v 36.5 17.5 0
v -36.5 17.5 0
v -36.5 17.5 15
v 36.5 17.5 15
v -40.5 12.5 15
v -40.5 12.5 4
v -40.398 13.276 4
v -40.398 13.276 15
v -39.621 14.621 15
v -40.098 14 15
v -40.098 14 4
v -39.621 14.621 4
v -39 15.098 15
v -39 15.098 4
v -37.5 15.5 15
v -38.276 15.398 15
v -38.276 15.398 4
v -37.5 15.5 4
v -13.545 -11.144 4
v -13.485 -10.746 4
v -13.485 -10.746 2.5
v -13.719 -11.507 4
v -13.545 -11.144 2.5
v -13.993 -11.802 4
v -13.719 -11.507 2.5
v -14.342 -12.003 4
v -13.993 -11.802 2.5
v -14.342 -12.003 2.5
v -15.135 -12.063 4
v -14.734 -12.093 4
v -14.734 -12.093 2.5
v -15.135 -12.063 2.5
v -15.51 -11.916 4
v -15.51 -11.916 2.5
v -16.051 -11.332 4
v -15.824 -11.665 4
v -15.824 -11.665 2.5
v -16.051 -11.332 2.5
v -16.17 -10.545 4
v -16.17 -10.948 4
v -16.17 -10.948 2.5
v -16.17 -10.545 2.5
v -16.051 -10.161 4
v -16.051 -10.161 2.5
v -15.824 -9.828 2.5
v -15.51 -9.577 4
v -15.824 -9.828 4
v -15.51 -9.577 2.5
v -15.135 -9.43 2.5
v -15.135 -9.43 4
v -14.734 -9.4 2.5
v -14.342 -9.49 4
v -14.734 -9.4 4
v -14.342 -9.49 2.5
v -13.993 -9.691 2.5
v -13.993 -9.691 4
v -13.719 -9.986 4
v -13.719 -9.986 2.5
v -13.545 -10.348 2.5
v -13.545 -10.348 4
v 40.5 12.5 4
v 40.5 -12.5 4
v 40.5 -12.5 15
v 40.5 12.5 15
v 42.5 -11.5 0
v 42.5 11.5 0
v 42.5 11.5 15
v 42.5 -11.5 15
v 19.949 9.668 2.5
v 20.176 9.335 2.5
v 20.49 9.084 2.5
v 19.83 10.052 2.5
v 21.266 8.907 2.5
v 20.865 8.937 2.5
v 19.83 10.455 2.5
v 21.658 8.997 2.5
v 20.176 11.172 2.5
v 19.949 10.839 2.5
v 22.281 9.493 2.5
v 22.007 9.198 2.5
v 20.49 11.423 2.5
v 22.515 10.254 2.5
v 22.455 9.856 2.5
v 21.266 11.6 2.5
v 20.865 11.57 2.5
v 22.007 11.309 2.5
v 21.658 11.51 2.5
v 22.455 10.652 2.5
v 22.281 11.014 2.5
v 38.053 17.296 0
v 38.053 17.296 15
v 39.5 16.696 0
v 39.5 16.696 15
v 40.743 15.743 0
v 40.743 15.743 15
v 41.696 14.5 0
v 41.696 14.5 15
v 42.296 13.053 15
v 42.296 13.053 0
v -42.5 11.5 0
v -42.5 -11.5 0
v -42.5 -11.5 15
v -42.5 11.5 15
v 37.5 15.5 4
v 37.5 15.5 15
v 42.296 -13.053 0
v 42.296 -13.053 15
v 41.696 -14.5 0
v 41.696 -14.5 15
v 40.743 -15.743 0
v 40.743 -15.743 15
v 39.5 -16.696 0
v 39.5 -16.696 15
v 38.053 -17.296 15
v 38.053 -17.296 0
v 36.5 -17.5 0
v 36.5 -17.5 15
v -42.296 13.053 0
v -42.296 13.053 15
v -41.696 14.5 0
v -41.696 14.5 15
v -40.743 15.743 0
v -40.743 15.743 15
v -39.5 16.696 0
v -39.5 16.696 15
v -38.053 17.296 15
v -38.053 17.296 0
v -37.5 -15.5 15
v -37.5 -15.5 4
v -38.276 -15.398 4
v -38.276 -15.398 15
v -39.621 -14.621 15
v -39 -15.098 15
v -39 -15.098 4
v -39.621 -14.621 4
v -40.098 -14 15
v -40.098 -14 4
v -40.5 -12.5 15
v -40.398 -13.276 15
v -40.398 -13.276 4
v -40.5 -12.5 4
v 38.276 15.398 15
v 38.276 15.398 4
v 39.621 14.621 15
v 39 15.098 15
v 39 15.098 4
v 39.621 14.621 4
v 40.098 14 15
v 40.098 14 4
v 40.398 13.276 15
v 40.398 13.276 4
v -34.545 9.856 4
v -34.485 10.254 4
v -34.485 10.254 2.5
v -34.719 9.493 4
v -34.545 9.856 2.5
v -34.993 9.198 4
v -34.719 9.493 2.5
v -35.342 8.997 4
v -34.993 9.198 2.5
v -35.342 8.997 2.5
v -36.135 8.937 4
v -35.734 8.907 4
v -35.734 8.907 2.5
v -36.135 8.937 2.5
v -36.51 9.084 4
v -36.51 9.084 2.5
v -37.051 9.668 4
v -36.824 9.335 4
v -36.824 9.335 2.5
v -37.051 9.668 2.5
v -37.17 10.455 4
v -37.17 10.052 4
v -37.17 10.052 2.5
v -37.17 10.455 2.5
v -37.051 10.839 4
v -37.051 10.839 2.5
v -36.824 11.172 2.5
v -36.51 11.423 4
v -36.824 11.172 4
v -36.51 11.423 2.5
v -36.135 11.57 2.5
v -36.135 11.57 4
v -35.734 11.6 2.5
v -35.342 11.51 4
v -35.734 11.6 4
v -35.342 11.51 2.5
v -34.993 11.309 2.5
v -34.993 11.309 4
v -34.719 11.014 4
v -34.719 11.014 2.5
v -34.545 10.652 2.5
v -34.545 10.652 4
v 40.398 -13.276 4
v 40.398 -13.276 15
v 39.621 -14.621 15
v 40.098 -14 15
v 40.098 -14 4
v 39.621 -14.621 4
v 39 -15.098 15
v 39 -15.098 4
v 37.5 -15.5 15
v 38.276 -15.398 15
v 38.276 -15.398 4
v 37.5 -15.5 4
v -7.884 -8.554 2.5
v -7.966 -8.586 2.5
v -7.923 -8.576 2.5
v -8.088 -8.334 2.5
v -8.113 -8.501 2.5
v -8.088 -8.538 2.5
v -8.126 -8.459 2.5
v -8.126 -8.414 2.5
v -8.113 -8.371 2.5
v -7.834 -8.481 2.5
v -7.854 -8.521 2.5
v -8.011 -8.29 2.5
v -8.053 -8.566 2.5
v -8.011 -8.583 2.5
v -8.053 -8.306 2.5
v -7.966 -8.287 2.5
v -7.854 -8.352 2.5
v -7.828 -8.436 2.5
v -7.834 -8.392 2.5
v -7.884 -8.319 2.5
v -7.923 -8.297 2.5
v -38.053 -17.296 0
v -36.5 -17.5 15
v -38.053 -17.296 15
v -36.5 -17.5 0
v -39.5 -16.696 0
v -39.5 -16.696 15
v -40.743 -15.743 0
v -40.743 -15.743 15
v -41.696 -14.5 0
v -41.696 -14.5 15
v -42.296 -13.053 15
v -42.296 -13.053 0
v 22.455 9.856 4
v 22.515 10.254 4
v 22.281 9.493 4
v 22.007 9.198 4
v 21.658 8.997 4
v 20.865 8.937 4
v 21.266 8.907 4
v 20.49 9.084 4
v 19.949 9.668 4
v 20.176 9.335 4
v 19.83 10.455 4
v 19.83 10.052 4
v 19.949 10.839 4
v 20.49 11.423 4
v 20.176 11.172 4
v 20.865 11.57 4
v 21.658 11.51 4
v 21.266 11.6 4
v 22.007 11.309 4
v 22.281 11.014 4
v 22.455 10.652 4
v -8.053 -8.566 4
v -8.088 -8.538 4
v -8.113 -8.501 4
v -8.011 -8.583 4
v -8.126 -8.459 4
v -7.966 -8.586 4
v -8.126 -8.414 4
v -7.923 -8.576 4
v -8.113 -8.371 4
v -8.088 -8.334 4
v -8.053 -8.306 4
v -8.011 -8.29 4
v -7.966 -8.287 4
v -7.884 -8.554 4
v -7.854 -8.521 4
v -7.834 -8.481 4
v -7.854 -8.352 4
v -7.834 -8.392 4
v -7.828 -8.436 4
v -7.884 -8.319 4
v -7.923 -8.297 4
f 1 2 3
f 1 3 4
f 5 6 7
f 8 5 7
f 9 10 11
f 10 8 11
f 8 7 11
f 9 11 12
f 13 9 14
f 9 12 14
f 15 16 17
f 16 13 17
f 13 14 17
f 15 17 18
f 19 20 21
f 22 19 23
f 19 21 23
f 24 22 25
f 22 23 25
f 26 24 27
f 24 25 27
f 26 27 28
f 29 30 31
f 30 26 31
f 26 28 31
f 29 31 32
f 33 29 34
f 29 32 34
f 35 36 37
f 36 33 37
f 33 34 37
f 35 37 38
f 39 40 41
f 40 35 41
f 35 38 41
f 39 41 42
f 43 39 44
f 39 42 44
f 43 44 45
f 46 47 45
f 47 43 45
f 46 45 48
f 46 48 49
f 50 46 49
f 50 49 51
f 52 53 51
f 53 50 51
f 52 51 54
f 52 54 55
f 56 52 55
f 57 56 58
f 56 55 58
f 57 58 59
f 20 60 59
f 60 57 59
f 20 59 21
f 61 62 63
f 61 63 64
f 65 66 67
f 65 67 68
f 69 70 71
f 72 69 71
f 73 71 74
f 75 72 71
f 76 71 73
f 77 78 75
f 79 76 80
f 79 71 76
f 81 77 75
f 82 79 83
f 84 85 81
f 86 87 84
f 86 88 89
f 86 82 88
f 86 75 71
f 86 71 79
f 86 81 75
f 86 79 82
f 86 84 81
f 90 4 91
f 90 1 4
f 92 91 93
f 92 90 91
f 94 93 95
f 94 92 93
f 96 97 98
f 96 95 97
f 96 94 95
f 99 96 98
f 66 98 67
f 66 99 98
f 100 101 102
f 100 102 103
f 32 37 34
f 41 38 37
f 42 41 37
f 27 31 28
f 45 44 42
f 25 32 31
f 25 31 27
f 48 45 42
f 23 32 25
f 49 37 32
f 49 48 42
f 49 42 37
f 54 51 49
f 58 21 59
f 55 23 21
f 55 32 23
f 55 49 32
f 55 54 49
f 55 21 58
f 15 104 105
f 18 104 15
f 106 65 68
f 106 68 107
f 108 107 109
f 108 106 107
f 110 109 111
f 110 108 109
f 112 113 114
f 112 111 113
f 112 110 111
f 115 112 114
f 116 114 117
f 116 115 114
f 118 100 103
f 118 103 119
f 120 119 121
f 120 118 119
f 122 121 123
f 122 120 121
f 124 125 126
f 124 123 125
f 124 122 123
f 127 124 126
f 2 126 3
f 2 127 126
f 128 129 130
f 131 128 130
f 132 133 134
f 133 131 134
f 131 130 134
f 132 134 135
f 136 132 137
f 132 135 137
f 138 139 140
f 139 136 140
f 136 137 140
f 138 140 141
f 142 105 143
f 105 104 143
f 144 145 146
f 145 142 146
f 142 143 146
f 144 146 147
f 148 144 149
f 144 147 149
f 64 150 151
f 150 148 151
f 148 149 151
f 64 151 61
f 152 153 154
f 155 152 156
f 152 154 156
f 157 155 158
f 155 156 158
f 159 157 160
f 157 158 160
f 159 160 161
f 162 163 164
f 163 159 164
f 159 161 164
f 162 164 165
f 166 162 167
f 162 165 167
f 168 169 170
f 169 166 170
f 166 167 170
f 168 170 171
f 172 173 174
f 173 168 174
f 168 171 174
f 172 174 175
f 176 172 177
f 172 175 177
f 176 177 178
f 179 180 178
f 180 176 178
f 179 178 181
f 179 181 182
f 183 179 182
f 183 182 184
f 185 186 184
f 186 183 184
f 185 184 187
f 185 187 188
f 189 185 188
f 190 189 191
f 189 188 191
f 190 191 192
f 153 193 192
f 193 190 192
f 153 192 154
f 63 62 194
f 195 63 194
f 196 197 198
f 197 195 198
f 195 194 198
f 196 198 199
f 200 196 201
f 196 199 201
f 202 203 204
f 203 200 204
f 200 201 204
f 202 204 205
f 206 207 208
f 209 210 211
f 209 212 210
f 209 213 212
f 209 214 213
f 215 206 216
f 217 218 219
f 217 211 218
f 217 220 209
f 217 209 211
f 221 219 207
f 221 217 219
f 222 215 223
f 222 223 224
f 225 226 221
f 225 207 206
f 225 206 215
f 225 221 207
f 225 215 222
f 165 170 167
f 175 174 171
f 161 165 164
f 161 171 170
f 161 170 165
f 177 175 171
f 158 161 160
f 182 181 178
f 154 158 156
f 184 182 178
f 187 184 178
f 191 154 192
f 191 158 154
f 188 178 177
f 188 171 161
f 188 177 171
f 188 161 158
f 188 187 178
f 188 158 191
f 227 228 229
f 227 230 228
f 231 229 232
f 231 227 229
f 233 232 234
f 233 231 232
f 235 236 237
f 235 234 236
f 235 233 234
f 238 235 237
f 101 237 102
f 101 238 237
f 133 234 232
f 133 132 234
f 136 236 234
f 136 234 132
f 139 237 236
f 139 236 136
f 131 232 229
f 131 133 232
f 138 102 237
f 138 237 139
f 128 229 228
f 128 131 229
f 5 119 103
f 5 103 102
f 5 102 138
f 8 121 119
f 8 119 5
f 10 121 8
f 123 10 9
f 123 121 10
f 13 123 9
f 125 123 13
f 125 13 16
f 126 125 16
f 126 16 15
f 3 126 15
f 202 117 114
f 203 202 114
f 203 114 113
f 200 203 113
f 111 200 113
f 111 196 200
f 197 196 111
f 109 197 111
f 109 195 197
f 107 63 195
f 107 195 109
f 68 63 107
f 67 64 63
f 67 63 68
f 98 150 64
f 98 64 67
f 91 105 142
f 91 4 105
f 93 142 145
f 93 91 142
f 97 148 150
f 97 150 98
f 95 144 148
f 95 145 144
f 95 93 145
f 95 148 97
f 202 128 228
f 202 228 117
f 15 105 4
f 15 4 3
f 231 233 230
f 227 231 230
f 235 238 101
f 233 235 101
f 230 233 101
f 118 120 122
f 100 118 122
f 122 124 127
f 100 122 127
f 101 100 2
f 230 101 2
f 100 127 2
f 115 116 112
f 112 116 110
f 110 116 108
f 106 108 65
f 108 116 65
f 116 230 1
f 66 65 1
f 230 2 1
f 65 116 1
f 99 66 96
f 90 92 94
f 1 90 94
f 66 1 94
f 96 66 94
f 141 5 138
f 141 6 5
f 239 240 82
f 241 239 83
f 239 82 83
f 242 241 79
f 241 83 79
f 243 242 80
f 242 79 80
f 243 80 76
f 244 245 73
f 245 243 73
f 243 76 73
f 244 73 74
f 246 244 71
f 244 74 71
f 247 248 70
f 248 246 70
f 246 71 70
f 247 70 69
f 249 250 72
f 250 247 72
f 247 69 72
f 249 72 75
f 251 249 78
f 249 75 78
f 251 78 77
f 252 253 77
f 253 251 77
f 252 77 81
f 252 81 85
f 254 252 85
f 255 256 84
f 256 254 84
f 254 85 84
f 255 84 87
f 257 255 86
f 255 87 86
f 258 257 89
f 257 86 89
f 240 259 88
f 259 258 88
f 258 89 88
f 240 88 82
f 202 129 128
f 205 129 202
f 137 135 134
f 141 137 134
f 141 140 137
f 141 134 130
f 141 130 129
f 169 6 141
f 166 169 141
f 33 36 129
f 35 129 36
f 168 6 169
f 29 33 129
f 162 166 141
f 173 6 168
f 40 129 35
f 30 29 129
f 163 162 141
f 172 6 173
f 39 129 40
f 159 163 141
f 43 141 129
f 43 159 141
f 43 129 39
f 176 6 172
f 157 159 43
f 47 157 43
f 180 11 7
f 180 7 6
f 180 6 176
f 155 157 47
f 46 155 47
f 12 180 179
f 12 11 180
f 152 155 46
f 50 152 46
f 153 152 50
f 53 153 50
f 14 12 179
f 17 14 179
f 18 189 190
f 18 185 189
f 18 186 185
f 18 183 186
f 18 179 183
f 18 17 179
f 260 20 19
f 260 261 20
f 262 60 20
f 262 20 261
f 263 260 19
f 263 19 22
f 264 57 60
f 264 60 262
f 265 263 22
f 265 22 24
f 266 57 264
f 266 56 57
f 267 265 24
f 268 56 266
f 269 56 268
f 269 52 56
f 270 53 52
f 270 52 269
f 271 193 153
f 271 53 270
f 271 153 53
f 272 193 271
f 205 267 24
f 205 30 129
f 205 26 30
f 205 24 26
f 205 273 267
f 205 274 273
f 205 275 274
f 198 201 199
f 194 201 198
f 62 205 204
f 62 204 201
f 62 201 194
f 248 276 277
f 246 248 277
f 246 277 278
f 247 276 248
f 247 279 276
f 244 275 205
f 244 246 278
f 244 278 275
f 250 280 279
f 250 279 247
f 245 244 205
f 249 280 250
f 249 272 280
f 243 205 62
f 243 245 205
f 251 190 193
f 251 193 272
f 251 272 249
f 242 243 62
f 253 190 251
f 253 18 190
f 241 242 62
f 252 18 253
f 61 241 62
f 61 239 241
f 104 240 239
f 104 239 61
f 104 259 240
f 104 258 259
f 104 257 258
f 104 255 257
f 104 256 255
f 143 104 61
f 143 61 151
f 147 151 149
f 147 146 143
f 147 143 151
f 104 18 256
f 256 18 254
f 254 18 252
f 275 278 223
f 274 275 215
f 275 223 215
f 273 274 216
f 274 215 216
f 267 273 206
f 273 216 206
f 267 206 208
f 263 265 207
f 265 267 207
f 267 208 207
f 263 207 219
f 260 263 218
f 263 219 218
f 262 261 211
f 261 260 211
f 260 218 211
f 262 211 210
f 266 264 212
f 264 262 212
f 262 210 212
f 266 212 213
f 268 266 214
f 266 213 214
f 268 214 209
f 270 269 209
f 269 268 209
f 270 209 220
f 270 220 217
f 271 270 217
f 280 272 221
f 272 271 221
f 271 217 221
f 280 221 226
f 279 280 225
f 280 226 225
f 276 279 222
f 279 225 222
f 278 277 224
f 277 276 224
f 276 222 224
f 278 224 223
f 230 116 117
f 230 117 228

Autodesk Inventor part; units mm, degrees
ref_plane "YZ Plane" through (0, 0, 0) normal (1, 0, 0) x (0, 1, 0)
ref_plane "XZ Plane" through (0, 0, 0) normal (0, 1, 0) x (-1, 0, 0)
ref_plane "XY Plane" through (0, 0, 0) normal (0, 0, 1) x (1, 0, 0)
sketch "Sketch1" plane through (0, 0, 0) normal (0, 0, 1) x (1, 0, 0)
  line L0 (-16.1167, 9.6221) -> (-16.0287, 9.5557)
  line L1 (-16.2227, 9.6523) -> (-16.1167, 9.6221)
  line L2 (-16.3325, 9.6421) -> (-16.2227, 9.6523)
  line L3 (-16.4312, 9.593) -> (-16.3325, 9.6421)
  line L4 (-16.5055, 9.5115) -> (-16.4312, 9.593)
  line L5 (-16.0287, 9.5557) -> (-15.9707, 9.4619)
  line L6 (37.1652, -14.1251) -> (-36.8348, -14.1251)
  line L7 (37.1652, -14.1251) -> (-36.8348, -14.1251)
  line L8 (-13.126, 14.2536) -> (37.1652, 14.2536)
  line L9 (-13.126, 14.2536) -> (37.1652, 14.2536)
  circle A0 centre (21.1652, 10.2536) radius 1.35
  circle A1 centre (21.1652, 10.2536) radius 1.35
  line L10 (40.1652, 11.2536) -> (40.1652, -11.1251)
  line L11 (40.1652, 11.2536) -> (40.1652, -11.1251)
  line L12 (40.1463, 11.5895) -> (40.1652, 11.2536)
  line L13 (40.1463, 11.5895) -> (40.1652, 11.2536)
  line L14 (-16.4721, 8.3515) -> (-16.5301, 8.4452)
  line L15 (-16.4721, 8.3515) -> (-16.5301, 8.4452)
  line L16 (-15.971, 13.4619) -> (-15.9507, 13.3536)
  line L17 (-16.5507, 13.3536) -> (-16.5456, 13.4087)
  line L18 (-16.5507, 13.3536) -> (-16.5456, 13.4087)
  line L19 (-15.971, 13.4619) -> (-15.9507, 13.3536)
  line L20 (-16.5456, 13.4087) -> (-16.5058, 13.5115)
  line L21 (-16.5456, 13.4087) -> (-16.5058, 13.5115)
  line L22 (-16.029, 13.5557) -> (-15.971, 13.4619)
  line L23 (-16.029, 13.5557) -> (-15.971, 13.4619)
  line L24 (-16.117, 13.6221) -> (-16.029, 13.5557)
  line L25 (-16.117, 13.6221) -> (-16.029, 13.5557)
  line L26 (-16.223, 13.6523) -> (-16.117, 13.6221)
  line L27 (-16.223, 13.6523) -> (-16.117, 13.6221)
  line L28 (-16.3328, 13.6421) -> (-16.223, 13.6523)
  line L29 (-16.3328, 13.6421) -> (-16.223, 13.6523)
  line L30 (-16.5058, 13.5115) -> (-16.4315, 13.593)
  line L31 (-16.4315, 13.593) -> (-16.3328, 13.6421)
  line L32 (-16.4315, 13.593) -> (-16.3328, 13.6421)
  line L33 (-16.5058, 13.5115) -> (-16.4315, 13.593)
  line L34 (-39.1803, -12.9956) -> (-39.375, -12.7212)
  line L35 (-38.9562, -13.2464) -> (-39.1803, -12.9956)
  line L36 (-38.9562, -13.2464) -> (-39.1803, -12.9956)
  line L37 (-38.7053, -13.4706) -> (-38.9562, -13.2464)
  line L38 (-38.7053, -13.4706) -> (-38.9562, -13.2464)
  line L39 (-38.4309, -13.6653) -> (-38.7053, -13.4706)
  line L40 (-38.4309, -13.6653) -> (-38.7053, -13.4706)
  line L41 (-38.1365, -13.828) -> (-38.4309, -13.6653)
  line L42 (-38.1365, -13.828) -> (-38.4309, -13.6653)
  line L43 (-37.8257, -13.9568) -> (-38.1365, -13.828)
  line L44 (-37.8257, -13.9568) -> (-38.1365, -13.828)
  line L45 (-37.5024, -14.0499) -> (-37.8257, -13.9568)
  line L46 (-37.5024, -14.0499) -> (-37.8257, -13.9568)
  line L47 (-37.1707, -14.1062) -> (-37.5024, -14.0499)
  line L48 (-37.1707, -14.1062) -> (-37.5024, -14.0499)
  line L49 (-36.8348, -14.1251) -> (-37.1707, -14.1062)
  line L50 (-36.8348, -14.1251) -> (-37.1707, -14.1062)
  line L51 (-39.1803, -12.9956) -> (-39.375, -12.7212)
  line L52 (-27.681, 12.0452) -> (-27.7013, 12.1536)
  line L53 (-27.1013, 12.1536) -> (-27.1064, 12.0984)
  line L54 (-27.1013, 12.1536) -> (-27.1064, 12.0984)
  line L55 (-27.681, 12.0452) -> (-27.7013, 12.1536)
  line L56 (-27.1064, 12.0984) -> (-27.1462, 11.9956)
  line L57 (-27.1064, 12.0984) -> (-27.1462, 11.9956)
  line L58 (-27.623, 11.9515) -> (-27.681, 12.0452)
  line L59 (-27.623, 11.9515) -> (-27.681, 12.0452)
  line L60 (-27.535, 11.885) -> (-27.623, 11.9515)
  line L61 (-27.535, 11.885) -> (-27.623, 11.9515)
  line L62 (-27.429, 11.8548) -> (-27.535, 11.885)
  line L63 (-27.429, 11.8548) -> (-27.535, 11.885)
  line L64 (-27.1462, 11.9956) -> (-27.2205, 11.9142)
  line L65 (-27.3192, 11.865) -> (-27.429, 11.8548)
  line L66 (-27.3192, 11.865) -> (-27.429, 11.8548)
  line L67 (-27.2205, 11.9142) -> (-27.3192, 11.865)
  line L68 (-27.2205, 11.9142) -> (-27.3192, 11.865)
  line L69 (-27.1462, 11.9956) -> (-27.2205, 11.9142)
  line L70 (-27.7013, 12.1536) -> (-27.7013, 13.3536)
  line L71 (-27.1013, 13.3536) -> (-27.1013, 12.1536)
  line L72 (-27.7013, 12.1536) -> (-27.7013, 13.3536)
  line L73 (-27.1013, 13.3536) -> (-27.1013, 12.1536)
  line L74 (-27.7013, 13.3536) -> (-27.6962, 13.4087)
  line L75 (-27.7013, 13.3536) -> (-27.6962, 13.4087)
  line L76 (-27.1216, 13.4619) -> (-27.1013, 13.3536)
  line L77 (-27.1216, 13.4619) -> (-27.1013, 13.3536)
  line L78 (-27.6962, 13.4087) -> (-27.6564, 13.5115)
  line L79 (-27.6962, 13.4087) -> (-27.6564, 13.5115)
  line L80 (-27.1796, 13.5557) -> (-27.1216, 13.4619)
  line L81 (-27.1796, 13.5557) -> (-27.1216, 13.4619)
  line L82 (-27.2676, 13.6221) -> (-27.1796, 13.5557)
  line L83 (-27.2676, 13.6221) -> (-27.1796, 13.5557)
  line L84 (-27.6564, 13.5115) -> (-27.5821, 13.593)
  line L85 (-27.6564, 13.5115) -> (-27.5821, 13.593)
  line L86 (-27.5821, 13.593) -> (-27.4834, 13.6421)
  line L87 (-27.5821, 13.593) -> (-27.4834, 13.6421)
  line L88 (-27.4834, 9.6421) -> (-27.3736, 9.6523)
  line L89 (-27.4834, 9.6421) -> (-27.3736, 9.6523)
  line L90 (-27.3736, 9.6523) -> (-27.2676, 9.6221)
  line L91 (-27.6564, 9.5115) -> (-27.5821, 9.593)
  line L92 (-27.6962, 9.4087) -> (-27.6564, 9.5115)
  line L93 (-27.3736, 9.6523) -> (-27.2676, 9.6221)
  line L94 (-16.5507, 12.1536) -> (-16.5507, 13.3536)
  line L95 (-16.5304, 12.0452) -> (-16.5507, 12.1536)
  line L96 (-16.4724, 11.9515) -> (-16.5304, 12.0452)
  line L97 (-15.9507, 13.3536) -> (-15.9507, 12.1536)
  line L98 (-15.9507, 12.1536) -> (-15.9558, 12.0984)
  line L99 (-16.5507, 12.1536) -> (-16.5507, 13.3536)
  line L100 (-15.9507, 13.3536) -> (-15.9507, 12.1536)
  line L101 (-15.9507, 12.1536) -> (-15.9558, 12.0984)
  line L102 (-16.5304, 12.0452) -> (-16.5507, 12.1536)
  line L103 (-15.9558, 12.0984) -> (-15.9956, 11.9956)
  line L104 (-16.3844, 11.885) -> (-16.4724, 11.9515)
  line L105 (-16.3844, 11.885) -> (-16.4724, 11.9515)
  line L106 (-16.2784, 11.8548) -> (-16.3844, 11.885)
  line L107 (-16.2784, 11.8548) -> (-16.3844, 11.885)
  line L108 (-16.1686, 11.865) -> (-16.2784, 11.8548)
  line L109 (-16.1686, 11.865) -> (-16.2784, 11.8548)
  line L110 (-15.9956, 11.9956) -> (-16.0699, 11.9142)
  line L111 (-15.9956, 11.9956) -> (-16.0699, 11.9142)
  line L112 (-16.0699, 11.9142) -> (-16.1686, 11.865)
  line L113 (-16.0699, 11.9142) -> (-16.1686, 11.865)
  line L114 (-15.9558, 12.0984) -> (-15.9956, 11.9956)
  line L115 (-15.9504, 8.5536) -> (-15.9555, 8.4984)
  line L116 (-15.9504, 9.3536) -> (-15.9504, 8.5536)
  line L117 (-15.9707, 9.4619) -> (-15.9504, 9.3536)
  line L118 (-16.0287, 9.5557) -> (-15.9707, 9.4619)
  line L119 (-16.1167, 9.6221) -> (-16.0287, 9.5557)
  line L120 (-16.2227, 9.6523) -> (-16.1167, 9.6221)
  line L121 (-16.5453, 9.4087) -> (-16.5055, 9.5115)
  line L122 (-16.5504, 9.3536) -> (-16.5453, 9.4087)
  line L123 (-16.5504, 8.5536) -> (-16.5504, 9.3536)
  line L124 (-16.3325, 9.6421) -> (-16.2227, 9.6523)
  line L125 (-16.4312, 9.593) -> (-16.3325, 9.6421)
  line L126 (-15.9707, 9.4619) -> (-15.9504, 9.3536)
  line L127 (-15.9504, 9.3536) -> (-15.9504, 8.5536)
  line L128 (-15.9504, 8.5536) -> (-15.9555, 8.4984)
  line L129 (-16.5055, 9.5115) -> (-16.4312, 9.593)
  line L130 (-16.5453, 9.4087) -> (-16.5055, 9.5115)
  line L131 (-16.5504, 9.3536) -> (-16.5453, 9.4087)
  line L132 (-16.5504, 8.5536) -> (-16.5504, 9.3536)
  line L133 (-17.226, 8.4536) -> (-17.226, 14.2536)
  line L134 (-26.426, 14.2536) -> (-26.426, 8.4536)
  line L135 (-26.426, 14.2536) -> (-26.426, 8.4536)
  line L136 (-17.226, 8.4536) -> (-17.226, 14.2536)
  line L137 (-17.226, 14.2536) -> (-13.126, 14.2536)
  line L138 (-17.226, 14.2536) -> (-13.126, 14.2536)
  line L139 (-16.4724, 11.9515) -> (-16.5304, 12.0452)
  line L140 (-26.426, 8.4536) -> (-17.226, 8.4536)
  line L141 (-26.426, 8.4536) -> (-17.226, 8.4536)
  circle A2 centre (-14.8348, -10.7464) radius 1.35
  circle A3 centre (-14.8348, -10.7464) radius 1.35
  circle A4 centre (-35.8348, 10.2536) radius 1.35
  line L142 (-37.5024, 14.1784) -> (-37.1707, 14.2347)
  line L143 (-37.8257, 14.0852) -> (-37.5024, 14.1784)
  line L144 (-36.8348, 14.2536) -> (-29.926, 14.2536)
  line L145 (-36.8348, 14.2536) -> (-29.926, 14.2536)
  circle A5 centre (-35.8348, 10.2536) radius 1.35
  line L146 (-37.1707, 14.2347) -> (-36.8348, 14.2536)
  line L147 (-37.1707, 14.2347) -> (-36.8348, 14.2536)
  line L148 (-37.5024, 14.1784) -> (-37.1707, 14.2347)
  line L149 (-37.8257, 14.0852) -> (-37.5024, 14.1784)
  line L150 (-27.681, 8.4452) -> (-27.7013, 8.5536)
  line L151 (-27.7013, 8.5536) -> (-27.7013, 9.3536)
  line L152 (-27.1216, 9.4619) -> (-27.1013, 9.3536)
  line L153 (-27.1013, 9.3536) -> (-27.1013, 8.5536)
  line L154 (-27.1796, 9.5557) -> (-27.1216, 9.4619)
  line L155 (-27.1013, 8.5536) -> (-27.1064, 8.4984)
  line L156 (-27.1064, 8.4984) -> (-27.1462, 8.3956)
  line L157 (-27.2676, 9.6221) -> (-27.1796, 9.5557)
  line L158 (-27.7013, 9.3536) -> (-27.6962, 9.4087)
  line L159 (-27.5821, 9.593) -> (-27.4834, 9.6421)
  line L160 (-27.2676, 9.6221) -> (-27.1796, 9.5557)
  line L161 (-27.6564, 9.5115) -> (-27.5821, 9.593)
  line L162 (-27.1796, 9.5557) -> (-27.1216, 9.4619)
  line L163 (-27.6962, 9.4087) -> (-27.6564, 9.5115)
  line L164 (-27.1216, 9.4619) -> (-27.1013, 9.3536)
  line L165 (-27.7013, 9.3536) -> (-27.6962, 9.4087)
  line L166 (-27.1013, 9.3536) -> (-27.1013, 8.5536)
  line L167 (-27.7013, 8.5536) -> (-27.7013, 9.3536)
  line L168 (-27.681, 8.4452) -> (-27.7013, 8.5536)
  line L169 (-27.623, 8.3515) -> (-27.681, 8.4452)
  line L170 (-27.623, 8.3515) -> (-27.681, 8.4452)
  line L171 (-27.5821, 9.593) -> (-27.4834, 9.6421)
  line L172 (-27.1064, 8.4984) -> (-27.1462, 8.3956)
  line L173 (-27.1462, 8.3956) -> (-27.2205, 8.3142)
  line L174 (-27.1462, 8.3956) -> (-27.2205, 8.3142)
  line L175 (-27.535, 8.285) -> (-27.623, 8.3515)
  line L176 (-27.535, 8.285) -> (-27.623, 8.3515)
  line L177 (-27.2205, 8.3142) -> (-27.3192, 8.265)
  line L178 (-27.2205, 8.3142) -> (-27.3192, 8.265)
  line L179 (-27.429, 8.2548) -> (-27.535, 8.285)
  line L180 (-27.429, 8.2548) -> (-27.535, 8.285)
  line L181 (-27.3192, 8.265) -> (-27.429, 8.2548)
  line L182 (-27.3192, 8.265) -> (-27.429, 8.2548)
  line L183 (-27.1013, 8.5536) -> (-27.1064, 8.4984)
  line L184 (-27.3736, 13.6523) -> (-27.2676, 13.6221)
  line L185 (-27.4834, 13.6421) -> (-27.3736, 13.6523)
  line L186 (-27.4834, 13.6421) -> (-27.3736, 13.6523)
  line L187 (-29.926, 14.2536) -> (-26.426, 14.2536)
  line L188 (-29.926, 14.2536) -> (-26.426, 14.2536)
  line L189 (-27.3736, 13.6523) -> (-27.2676, 13.6221)
  circle A6 centre (-7.9777, -8.4364) radius 0.15
  circle A7 centre (-7.9777, -8.4364) radius 0.15
  line L190 (-15.9555, 8.4984) -> (-15.9953, 8.3956)
  line L191 (-15.9555, 8.4984) -> (-15.9953, 8.3956)
  line L192 (-15.9953, 8.3956) -> (-16.0696, 8.3142)
  line L193 (-15.9953, 8.3956) -> (-16.0696, 8.3142)
  line L194 (-16.0696, 8.3142) -> (-16.1683, 8.265)
  line L195 (-16.0696, 8.3142) -> (-16.1683, 8.265)
  line L196 (-16.1683, 8.265) -> (-16.2781, 8.2548)
  line L197 (-16.1683, 8.265) -> (-16.2781, 8.2548)
  line L198 (-16.2781, 8.2548) -> (-16.3841, 8.285)
  line L199 (-16.2781, 8.2548) -> (-16.3841, 8.285)
  line L200 (-16.3841, 8.285) -> (-16.4721, 8.3515)
  line L201 (-16.3841, 8.285) -> (-16.4721, 8.3515)
  line L202 (-16.5301, 8.4452) -> (-16.5504, 8.5536)
  line L203 (-16.5301, 8.4452) -> (-16.5504, 8.5536)
  line L204 (-39.8348, -11.1251) -> (-39.8348, 11.2536)
  line L205 (-39.8348, -11.1251) -> (-39.8348, 11.2536)
  line L206 (39.0356, 13.5991) -> (39.2865, 13.3749)
  line L207 (39.0356, 13.5991) -> (39.2865, 13.3749)
  line L208 (38.7613, 13.7937) -> (39.0356, 13.5991)
  line L209 (38.7613, 13.7937) -> (39.0356, 13.5991)
  line L210 (38.4668, 13.9565) -> (38.7613, 13.7937)
  line L211 (38.4668, 13.9565) -> (38.7613, 13.7937)
  line L212 (38.156, 14.0852) -> (38.4668, 13.9565)
  line L213 (38.156, 14.0852) -> (38.4668, 13.9565)
  line L214 (37.8327, 14.1784) -> (38.156, 14.0852)
  line L215 (37.8327, 14.1784) -> (38.156, 14.0852)
  line L216 (37.5011, 14.2347) -> (37.8327, 14.1784)
  line L217 (37.5011, 14.2347) -> (37.8327, 14.1784)
  line L218 (37.1652, 14.2536) -> (37.5011, 14.2347)
  line L219 (37.1652, 14.2536) -> (37.5011, 14.2347)
  line L220 (39.2865, 13.3749) -> (39.5107, 13.124)
  line L221 (39.2865, 13.3749) -> (39.5107, 13.124)
  line L222 (39.5107, 13.124) -> (39.7053, 12.8497)
  line L223 (39.5107, 13.124) -> (39.7053, 12.8497)
  line L224 (39.7053, 12.8497) -> (39.8681, 12.5552)
  line L225 (39.8681, 12.5552) -> (39.9968, 12.2444)
  line L226 (39.8681, 12.5552) -> (39.9968, 12.2444)
  line L227 (39.9968, 12.2444) -> (40.0899, 11.9211)
  line L228 (39.9968, 12.2444) -> (40.0899, 11.9211)
  line L229 (40.0899, 11.9211) -> (40.1463, 11.5895)
  line L230 (40.0899, 11.9211) -> (40.1463, 11.5895)
  line L231 (39.7053, 12.8497) -> (39.8681, 12.5552)
  line L232 (-39.8348, 11.2536) -> (-39.816, 11.5895)
  line L233 (-39.816, 11.5895) -> (-39.7596, 11.9211)
  line L234 (-38.1365, 13.9565) -> (-37.8257, 14.0852)
  line L235 (-38.4309, 13.7937) -> (-38.1365, 13.9565)
  line L236 (-38.7053, 13.5991) -> (-38.4309, 13.7937)
  line L237 (-38.9562, 13.3749) -> (-38.7053, 13.5991)
  line L238 (-39.1803, 13.124) -> (-38.9562, 13.3749)
  line L239 (-39.375, 12.8497) -> (-39.1803, 13.124)
  line L240 (-39.5377, 12.5552) -> (-39.375, 12.8497)
  line L241 (-39.6665, 12.2444) -> (-39.5377, 12.5552)
  line L242 (-39.7596, 11.9211) -> (-39.6665, 12.2444)
  line L243 (-38.1365, 13.9565) -> (-37.8257, 14.0852)
  line L244 (-38.4309, 13.7937) -> (-38.1365, 13.9565)
  line L245 (-38.7053, 13.5991) -> (-38.4309, 13.7937)
  line L246 (-38.9562, 13.3749) -> (-38.7053, 13.5991)
  line L247 (-39.1803, 13.124) -> (-38.9562, 13.3749)
  line L248 (-39.375, 12.8497) -> (-39.1803, 13.124)
  line L249 (-39.5377, 12.5552) -> (-39.375, 12.8497)
  line L250 (-39.6665, 12.2444) -> (-39.5377, 12.5552)
  line L251 (-39.7596, 11.9211) -> (-39.6665, 12.2444)
  line L252 (-39.8348, 11.2536) -> (-39.816, 11.5895)
  line L253 (-39.816, 11.5895) -> (-39.7596, 11.9211)
  line L254 (-39.5377, -12.4268) -> (-39.6665, -12.1159)
  line L255 (-39.375, -12.7212) -> (-39.5377, -12.4268)
  line L256 (-39.375, -12.7212) -> (-39.5377, -12.4268)
  line L257 (-39.5377, -12.4268) -> (-39.6665, -12.1159)
  line L258 (-39.6665, -12.1159) -> (-39.7596, -11.7927)
  line L259 (-39.7596, -11.7927) -> (-39.816, -11.461)
  line L260 (-39.7596, -11.7927) -> (-39.816, -11.461)
  line L261 (-39.816, -11.461) -> (-39.8348, -11.1251)
  line L262 (-39.816, -11.461) -> (-39.8348, -11.1251)
  line L263 (-39.6665, -12.1159) -> (-39.7596, -11.7927)
  line L264 (37.5011, -14.1062) -> (37.1652, -14.1251)
  line L265 (38.7613, -13.6653) -> (38.4668, -13.828)
  line L266 (38.7613, -13.6653) -> (38.4668, -13.828)
  line L267 (39.5107, -12.9956) -> (39.2865, -13.2464)
  line L268 (39.9968, -12.1159) -> (39.8681, -12.4268)
  line L269 (40.1652, -11.1251) -> (40.1463, -11.461)
  line L270 (40.1652, -11.1251) -> (40.1463, -11.461)
  line L271 (40.1463, -11.461) -> (40.0899, -11.7927)
  line L272 (40.1463, -11.461) -> (40.0899, -11.7927)
  line L273 (40.0899, -11.7927) -> (39.9968, -12.1159)
  line L274 (40.0899, -11.7927) -> (39.9968, -12.1159)
  line L275 (39.9968, -12.1159) -> (39.8681, -12.4268)
  line L276 (39.8681, -12.4268) -> (39.7053, -12.7212)
  line L277 (39.8681, -12.4268) -> (39.7053, -12.7212)
  line L278 (39.7053, -12.7212) -> (39.5107, -12.9956)
  line L279 (39.7053, -12.7212) -> (39.5107, -12.9956)
  line L280 (39.5107, -12.9956) -> (39.2865, -13.2464)
  line L281 (39.2865, -13.2464) -> (39.0356, -13.4706)
  line L282 (39.2865, -13.2464) -> (39.0356, -13.4706)
  line L283 (39.0356, -13.4706) -> (38.7613, -13.6653)
  line L284 (39.0356, -13.4706) -> (38.7613, -13.6653)
  line L285 (38.4668, -13.828) -> (38.156, -13.9568)
  line L286 (38.4668, -13.828) -> (38.156, -13.9568)
  line L287 (38.156, -13.9568) -> (37.8327, -14.0499)
  line L288 (37.8327, -14.0499) -> (37.5011, -14.1062)
  line L289 (37.8327, -14.0499) -> (37.5011, -14.1062)
  line L290 (37.5011, -14.1062) -> (37.1652, -14.1251)
  line L291 (38.156, -13.9568) -> (37.8327, -14.0499)
  line L292 (-36.5, 17.5) -> (36.5, 17.5)
  line L293 (42.5, 11.5) -> (42.5, -11.5)
  line L294 (36.5, -17.5) -> (-36.5, -17.5)
  line L295 (-42.5, -11.5) -> (-42.5, 11.5)
  line L296 (-42.5, 17.5) -> (42.5, -17.5) construction
  line L297 (42.5, 17.5) -> (-42.5, -17.5) construction
  arc A8 (-36.5, 17.5) -> (-42.5, 11.5) centre (-36.5, 11.5) ccw
  arc A9 (-42.5, -11.5) -> (-36.5, -17.5) centre (-36.5, -11.5) ccw
  arc A10 (36.5, -17.5) -> (42.5, -11.5) centre (36.5, -11.5) ccw
  arc A11 (42.5, 11.5) -> (36.5, 17.5) centre (36.5, 11.5) ccw
  line L298 (37.5, 15.5) -> (-37.5, 15.5)
  line L299 (-40.5, 12.5) -> (-40.5, -12.5)
  line L300 (-37.5, -15.5) -> (37.5, -15.5)
  line L301 (40.5, -12.5) -> (40.5, 12.5)
  line L302 (40.5, 15.5) -> (-40.5, -15.5) construction
  line L303 (-40.5, 15.5) -> (40.5, -15.5) construction
  arc A12 (-40.5, -12.5) -> (-37.5, -15.5) centre (-37.5, -12.5) ccw
  arc A13 (-37.5, 15.5) -> (-40.5, 12.5) centre (-37.5, 12.5) ccw
  arc A14 (40.5, 12.5) -> (37.5, 15.5) centre (37.5, 12.5) ccw
  arc A15 (37.5, -15.5) -> (40.5, -12.5) centre (37.5, -12.5) ccw
  point P0 (0, 0)
  dimension "d2" = 85
  dimension "d3" = 35
  dimension "d4" = 6
  dimension "d5" = 81
  dimension "d6" = 31
  dimension "d7" = 3
  dimension "d8" = 3
extrude "Extrusion1" add sketch "Sketch1" along normal blind 2.5 contours L0 L5 L117 L116 L115 L190 L192 L194 L196 L198 L200 L14 L202 L123 L122 L121 L4 L3 L2 L1 | L6 L49 L47 L45 L43 L41 L39 L37 L35 L34 L255 L254 L258 L259 L261 L204 L232 L233 L242 L241 L240 L239 L238 L237 L236 L235 L234 L143 L142 L146 L144 L187 L134 L140 L133 L137 L8 L218 L216 L214 L212 L210 L208 L206 L220 L222 L224 L225 L227 L229 L12 L10 L269 L271 L273 L268 L276 L278 L267 L281 L283 L265 L285 L287 L288 L264 | A0 | L16 L97 L98 L103 L110 L112 L108 L106 L104 L96 L95 L94 L17 L20 L30 L31 L28 L26 L24 L22 | L52 L70 L74 L78 L84 L86 L185 L184 L82 L80 L76 L71 L53 L56 L64 L67 L65 L62 L60 L58 | L88 L90 L157 L154 L152 L153 L155 L156 L173 L177 L181 L179 L175 L169 L150 L151 L158 L92 L91 L159 | A2 | A4 | A6 | L292 A11 L293 A10 L294 A9 L295 A8 | A14 L301 A15 L300 A12 L299 A13 L298
extrude "Extrusion2" add sketch "Sketch1" along normal blind 15 contours L292 A11 L293 A10 L294 A9 L295 A8
extrude "Extrusion3" add sketch "Sketch1" along normal blind 4 contours L0 L5 L117 L116 L115 L190 L192 L194 L196 L198 L200 L14 L202 L123 L122 L121 L4 L3 L2 L1 | L6 L49 L47 L45 L43 L41 L39 L37 L35 L34 L255 L254 L258 L259 L261 L204 L232 L233 L242 L241 L240 L239 L238 L237 L236 L235 L234 L143 L142 L146 L144 L187 L134 L140 L133 L137 L8 L218 L216 L214 L212 L210 L208 L206 L220 L222 L224 L225 L227 L229 L12 L10 L269 L271 L273 L268 L276 L278 L267 L281 L283 L265 L285 L287 L288 L264 | L16 L97 L98 L103 L110 L112 L108 L106 L104 L96 L95 L94 L17 L20 L30 L31 L28 L26 L24 L22 | L52 L70 L74 L78 L84 L86 L185 L184 L82 L80 L76 L71 L53 L56 L64 L67 L65 L62 L60 L58 | L88 L90 L157 L154 L152 L153 L155 L156 L173 L177 L181 L179 L175 L169 L150 L151 L158 L92 L91 L159 | A14 L301 A15 L300 A12 L299 A13 L298
sketch "Sketch3" plane through (0, 0, 15) normal (0, 0, 1) x (1, 0, 0)
  line L0 (-36.5, -17.5) -> (36.5, -17.5) projected
  arc A0 (36.5, -17.5) -> (42.5, -11.5) centre (36.5, -11.5) ccw projected
  line L1 (42.5, -11.5) -> (42.5, 11.5) projected
  arc A1 (42.5, 11.5) -> (36.5, 17.5) centre (36.5, 11.5) ccw projected
  line L2 (36.5, 17.5) -> (-36.5, 17.5) projected
  arc A2 (-36.5, 17.5) -> (-42.5, 11.5) centre (-36.5, 11.5) ccw projected
  line L3 (-42.5, 11.5) -> (-42.5, -11.5) projected
  arc A3 (-42.5, -11.5) -> (-36.5, -17.5) centre (-36.5, -11.5) ccw projected
  arc A4 (40.5, 12.5) -> (37.5, 15.5) centre (37.5, 12.5) ccw projected
  line L4 (40.5, 12.5) -> (40.5, -12.5) projected
  arc A5 (37.5, -15.5) -> (40.5, -12.5) centre (37.5, -12.5) ccw projected
  line L5 (37.5, -15.5) -> (-37.5, -15.5) projected
  arc A6 (-40.5, -12.5) -> (-37.5, -15.5) centre (-37.5, -12.5) ccw projected
  line L6 (-40.5, -12.5) -> (-40.5, 12.5) projected
  arc A7 (-37.5, 15.5) -> (-40.5, 12.5) centre (-37.5, 12.5) ccw projected
  line L7 (-37.5, 15.5) -> (37.5, 15.5) projected
  point P0 (0, 0)
properties part number "CASE_0"
